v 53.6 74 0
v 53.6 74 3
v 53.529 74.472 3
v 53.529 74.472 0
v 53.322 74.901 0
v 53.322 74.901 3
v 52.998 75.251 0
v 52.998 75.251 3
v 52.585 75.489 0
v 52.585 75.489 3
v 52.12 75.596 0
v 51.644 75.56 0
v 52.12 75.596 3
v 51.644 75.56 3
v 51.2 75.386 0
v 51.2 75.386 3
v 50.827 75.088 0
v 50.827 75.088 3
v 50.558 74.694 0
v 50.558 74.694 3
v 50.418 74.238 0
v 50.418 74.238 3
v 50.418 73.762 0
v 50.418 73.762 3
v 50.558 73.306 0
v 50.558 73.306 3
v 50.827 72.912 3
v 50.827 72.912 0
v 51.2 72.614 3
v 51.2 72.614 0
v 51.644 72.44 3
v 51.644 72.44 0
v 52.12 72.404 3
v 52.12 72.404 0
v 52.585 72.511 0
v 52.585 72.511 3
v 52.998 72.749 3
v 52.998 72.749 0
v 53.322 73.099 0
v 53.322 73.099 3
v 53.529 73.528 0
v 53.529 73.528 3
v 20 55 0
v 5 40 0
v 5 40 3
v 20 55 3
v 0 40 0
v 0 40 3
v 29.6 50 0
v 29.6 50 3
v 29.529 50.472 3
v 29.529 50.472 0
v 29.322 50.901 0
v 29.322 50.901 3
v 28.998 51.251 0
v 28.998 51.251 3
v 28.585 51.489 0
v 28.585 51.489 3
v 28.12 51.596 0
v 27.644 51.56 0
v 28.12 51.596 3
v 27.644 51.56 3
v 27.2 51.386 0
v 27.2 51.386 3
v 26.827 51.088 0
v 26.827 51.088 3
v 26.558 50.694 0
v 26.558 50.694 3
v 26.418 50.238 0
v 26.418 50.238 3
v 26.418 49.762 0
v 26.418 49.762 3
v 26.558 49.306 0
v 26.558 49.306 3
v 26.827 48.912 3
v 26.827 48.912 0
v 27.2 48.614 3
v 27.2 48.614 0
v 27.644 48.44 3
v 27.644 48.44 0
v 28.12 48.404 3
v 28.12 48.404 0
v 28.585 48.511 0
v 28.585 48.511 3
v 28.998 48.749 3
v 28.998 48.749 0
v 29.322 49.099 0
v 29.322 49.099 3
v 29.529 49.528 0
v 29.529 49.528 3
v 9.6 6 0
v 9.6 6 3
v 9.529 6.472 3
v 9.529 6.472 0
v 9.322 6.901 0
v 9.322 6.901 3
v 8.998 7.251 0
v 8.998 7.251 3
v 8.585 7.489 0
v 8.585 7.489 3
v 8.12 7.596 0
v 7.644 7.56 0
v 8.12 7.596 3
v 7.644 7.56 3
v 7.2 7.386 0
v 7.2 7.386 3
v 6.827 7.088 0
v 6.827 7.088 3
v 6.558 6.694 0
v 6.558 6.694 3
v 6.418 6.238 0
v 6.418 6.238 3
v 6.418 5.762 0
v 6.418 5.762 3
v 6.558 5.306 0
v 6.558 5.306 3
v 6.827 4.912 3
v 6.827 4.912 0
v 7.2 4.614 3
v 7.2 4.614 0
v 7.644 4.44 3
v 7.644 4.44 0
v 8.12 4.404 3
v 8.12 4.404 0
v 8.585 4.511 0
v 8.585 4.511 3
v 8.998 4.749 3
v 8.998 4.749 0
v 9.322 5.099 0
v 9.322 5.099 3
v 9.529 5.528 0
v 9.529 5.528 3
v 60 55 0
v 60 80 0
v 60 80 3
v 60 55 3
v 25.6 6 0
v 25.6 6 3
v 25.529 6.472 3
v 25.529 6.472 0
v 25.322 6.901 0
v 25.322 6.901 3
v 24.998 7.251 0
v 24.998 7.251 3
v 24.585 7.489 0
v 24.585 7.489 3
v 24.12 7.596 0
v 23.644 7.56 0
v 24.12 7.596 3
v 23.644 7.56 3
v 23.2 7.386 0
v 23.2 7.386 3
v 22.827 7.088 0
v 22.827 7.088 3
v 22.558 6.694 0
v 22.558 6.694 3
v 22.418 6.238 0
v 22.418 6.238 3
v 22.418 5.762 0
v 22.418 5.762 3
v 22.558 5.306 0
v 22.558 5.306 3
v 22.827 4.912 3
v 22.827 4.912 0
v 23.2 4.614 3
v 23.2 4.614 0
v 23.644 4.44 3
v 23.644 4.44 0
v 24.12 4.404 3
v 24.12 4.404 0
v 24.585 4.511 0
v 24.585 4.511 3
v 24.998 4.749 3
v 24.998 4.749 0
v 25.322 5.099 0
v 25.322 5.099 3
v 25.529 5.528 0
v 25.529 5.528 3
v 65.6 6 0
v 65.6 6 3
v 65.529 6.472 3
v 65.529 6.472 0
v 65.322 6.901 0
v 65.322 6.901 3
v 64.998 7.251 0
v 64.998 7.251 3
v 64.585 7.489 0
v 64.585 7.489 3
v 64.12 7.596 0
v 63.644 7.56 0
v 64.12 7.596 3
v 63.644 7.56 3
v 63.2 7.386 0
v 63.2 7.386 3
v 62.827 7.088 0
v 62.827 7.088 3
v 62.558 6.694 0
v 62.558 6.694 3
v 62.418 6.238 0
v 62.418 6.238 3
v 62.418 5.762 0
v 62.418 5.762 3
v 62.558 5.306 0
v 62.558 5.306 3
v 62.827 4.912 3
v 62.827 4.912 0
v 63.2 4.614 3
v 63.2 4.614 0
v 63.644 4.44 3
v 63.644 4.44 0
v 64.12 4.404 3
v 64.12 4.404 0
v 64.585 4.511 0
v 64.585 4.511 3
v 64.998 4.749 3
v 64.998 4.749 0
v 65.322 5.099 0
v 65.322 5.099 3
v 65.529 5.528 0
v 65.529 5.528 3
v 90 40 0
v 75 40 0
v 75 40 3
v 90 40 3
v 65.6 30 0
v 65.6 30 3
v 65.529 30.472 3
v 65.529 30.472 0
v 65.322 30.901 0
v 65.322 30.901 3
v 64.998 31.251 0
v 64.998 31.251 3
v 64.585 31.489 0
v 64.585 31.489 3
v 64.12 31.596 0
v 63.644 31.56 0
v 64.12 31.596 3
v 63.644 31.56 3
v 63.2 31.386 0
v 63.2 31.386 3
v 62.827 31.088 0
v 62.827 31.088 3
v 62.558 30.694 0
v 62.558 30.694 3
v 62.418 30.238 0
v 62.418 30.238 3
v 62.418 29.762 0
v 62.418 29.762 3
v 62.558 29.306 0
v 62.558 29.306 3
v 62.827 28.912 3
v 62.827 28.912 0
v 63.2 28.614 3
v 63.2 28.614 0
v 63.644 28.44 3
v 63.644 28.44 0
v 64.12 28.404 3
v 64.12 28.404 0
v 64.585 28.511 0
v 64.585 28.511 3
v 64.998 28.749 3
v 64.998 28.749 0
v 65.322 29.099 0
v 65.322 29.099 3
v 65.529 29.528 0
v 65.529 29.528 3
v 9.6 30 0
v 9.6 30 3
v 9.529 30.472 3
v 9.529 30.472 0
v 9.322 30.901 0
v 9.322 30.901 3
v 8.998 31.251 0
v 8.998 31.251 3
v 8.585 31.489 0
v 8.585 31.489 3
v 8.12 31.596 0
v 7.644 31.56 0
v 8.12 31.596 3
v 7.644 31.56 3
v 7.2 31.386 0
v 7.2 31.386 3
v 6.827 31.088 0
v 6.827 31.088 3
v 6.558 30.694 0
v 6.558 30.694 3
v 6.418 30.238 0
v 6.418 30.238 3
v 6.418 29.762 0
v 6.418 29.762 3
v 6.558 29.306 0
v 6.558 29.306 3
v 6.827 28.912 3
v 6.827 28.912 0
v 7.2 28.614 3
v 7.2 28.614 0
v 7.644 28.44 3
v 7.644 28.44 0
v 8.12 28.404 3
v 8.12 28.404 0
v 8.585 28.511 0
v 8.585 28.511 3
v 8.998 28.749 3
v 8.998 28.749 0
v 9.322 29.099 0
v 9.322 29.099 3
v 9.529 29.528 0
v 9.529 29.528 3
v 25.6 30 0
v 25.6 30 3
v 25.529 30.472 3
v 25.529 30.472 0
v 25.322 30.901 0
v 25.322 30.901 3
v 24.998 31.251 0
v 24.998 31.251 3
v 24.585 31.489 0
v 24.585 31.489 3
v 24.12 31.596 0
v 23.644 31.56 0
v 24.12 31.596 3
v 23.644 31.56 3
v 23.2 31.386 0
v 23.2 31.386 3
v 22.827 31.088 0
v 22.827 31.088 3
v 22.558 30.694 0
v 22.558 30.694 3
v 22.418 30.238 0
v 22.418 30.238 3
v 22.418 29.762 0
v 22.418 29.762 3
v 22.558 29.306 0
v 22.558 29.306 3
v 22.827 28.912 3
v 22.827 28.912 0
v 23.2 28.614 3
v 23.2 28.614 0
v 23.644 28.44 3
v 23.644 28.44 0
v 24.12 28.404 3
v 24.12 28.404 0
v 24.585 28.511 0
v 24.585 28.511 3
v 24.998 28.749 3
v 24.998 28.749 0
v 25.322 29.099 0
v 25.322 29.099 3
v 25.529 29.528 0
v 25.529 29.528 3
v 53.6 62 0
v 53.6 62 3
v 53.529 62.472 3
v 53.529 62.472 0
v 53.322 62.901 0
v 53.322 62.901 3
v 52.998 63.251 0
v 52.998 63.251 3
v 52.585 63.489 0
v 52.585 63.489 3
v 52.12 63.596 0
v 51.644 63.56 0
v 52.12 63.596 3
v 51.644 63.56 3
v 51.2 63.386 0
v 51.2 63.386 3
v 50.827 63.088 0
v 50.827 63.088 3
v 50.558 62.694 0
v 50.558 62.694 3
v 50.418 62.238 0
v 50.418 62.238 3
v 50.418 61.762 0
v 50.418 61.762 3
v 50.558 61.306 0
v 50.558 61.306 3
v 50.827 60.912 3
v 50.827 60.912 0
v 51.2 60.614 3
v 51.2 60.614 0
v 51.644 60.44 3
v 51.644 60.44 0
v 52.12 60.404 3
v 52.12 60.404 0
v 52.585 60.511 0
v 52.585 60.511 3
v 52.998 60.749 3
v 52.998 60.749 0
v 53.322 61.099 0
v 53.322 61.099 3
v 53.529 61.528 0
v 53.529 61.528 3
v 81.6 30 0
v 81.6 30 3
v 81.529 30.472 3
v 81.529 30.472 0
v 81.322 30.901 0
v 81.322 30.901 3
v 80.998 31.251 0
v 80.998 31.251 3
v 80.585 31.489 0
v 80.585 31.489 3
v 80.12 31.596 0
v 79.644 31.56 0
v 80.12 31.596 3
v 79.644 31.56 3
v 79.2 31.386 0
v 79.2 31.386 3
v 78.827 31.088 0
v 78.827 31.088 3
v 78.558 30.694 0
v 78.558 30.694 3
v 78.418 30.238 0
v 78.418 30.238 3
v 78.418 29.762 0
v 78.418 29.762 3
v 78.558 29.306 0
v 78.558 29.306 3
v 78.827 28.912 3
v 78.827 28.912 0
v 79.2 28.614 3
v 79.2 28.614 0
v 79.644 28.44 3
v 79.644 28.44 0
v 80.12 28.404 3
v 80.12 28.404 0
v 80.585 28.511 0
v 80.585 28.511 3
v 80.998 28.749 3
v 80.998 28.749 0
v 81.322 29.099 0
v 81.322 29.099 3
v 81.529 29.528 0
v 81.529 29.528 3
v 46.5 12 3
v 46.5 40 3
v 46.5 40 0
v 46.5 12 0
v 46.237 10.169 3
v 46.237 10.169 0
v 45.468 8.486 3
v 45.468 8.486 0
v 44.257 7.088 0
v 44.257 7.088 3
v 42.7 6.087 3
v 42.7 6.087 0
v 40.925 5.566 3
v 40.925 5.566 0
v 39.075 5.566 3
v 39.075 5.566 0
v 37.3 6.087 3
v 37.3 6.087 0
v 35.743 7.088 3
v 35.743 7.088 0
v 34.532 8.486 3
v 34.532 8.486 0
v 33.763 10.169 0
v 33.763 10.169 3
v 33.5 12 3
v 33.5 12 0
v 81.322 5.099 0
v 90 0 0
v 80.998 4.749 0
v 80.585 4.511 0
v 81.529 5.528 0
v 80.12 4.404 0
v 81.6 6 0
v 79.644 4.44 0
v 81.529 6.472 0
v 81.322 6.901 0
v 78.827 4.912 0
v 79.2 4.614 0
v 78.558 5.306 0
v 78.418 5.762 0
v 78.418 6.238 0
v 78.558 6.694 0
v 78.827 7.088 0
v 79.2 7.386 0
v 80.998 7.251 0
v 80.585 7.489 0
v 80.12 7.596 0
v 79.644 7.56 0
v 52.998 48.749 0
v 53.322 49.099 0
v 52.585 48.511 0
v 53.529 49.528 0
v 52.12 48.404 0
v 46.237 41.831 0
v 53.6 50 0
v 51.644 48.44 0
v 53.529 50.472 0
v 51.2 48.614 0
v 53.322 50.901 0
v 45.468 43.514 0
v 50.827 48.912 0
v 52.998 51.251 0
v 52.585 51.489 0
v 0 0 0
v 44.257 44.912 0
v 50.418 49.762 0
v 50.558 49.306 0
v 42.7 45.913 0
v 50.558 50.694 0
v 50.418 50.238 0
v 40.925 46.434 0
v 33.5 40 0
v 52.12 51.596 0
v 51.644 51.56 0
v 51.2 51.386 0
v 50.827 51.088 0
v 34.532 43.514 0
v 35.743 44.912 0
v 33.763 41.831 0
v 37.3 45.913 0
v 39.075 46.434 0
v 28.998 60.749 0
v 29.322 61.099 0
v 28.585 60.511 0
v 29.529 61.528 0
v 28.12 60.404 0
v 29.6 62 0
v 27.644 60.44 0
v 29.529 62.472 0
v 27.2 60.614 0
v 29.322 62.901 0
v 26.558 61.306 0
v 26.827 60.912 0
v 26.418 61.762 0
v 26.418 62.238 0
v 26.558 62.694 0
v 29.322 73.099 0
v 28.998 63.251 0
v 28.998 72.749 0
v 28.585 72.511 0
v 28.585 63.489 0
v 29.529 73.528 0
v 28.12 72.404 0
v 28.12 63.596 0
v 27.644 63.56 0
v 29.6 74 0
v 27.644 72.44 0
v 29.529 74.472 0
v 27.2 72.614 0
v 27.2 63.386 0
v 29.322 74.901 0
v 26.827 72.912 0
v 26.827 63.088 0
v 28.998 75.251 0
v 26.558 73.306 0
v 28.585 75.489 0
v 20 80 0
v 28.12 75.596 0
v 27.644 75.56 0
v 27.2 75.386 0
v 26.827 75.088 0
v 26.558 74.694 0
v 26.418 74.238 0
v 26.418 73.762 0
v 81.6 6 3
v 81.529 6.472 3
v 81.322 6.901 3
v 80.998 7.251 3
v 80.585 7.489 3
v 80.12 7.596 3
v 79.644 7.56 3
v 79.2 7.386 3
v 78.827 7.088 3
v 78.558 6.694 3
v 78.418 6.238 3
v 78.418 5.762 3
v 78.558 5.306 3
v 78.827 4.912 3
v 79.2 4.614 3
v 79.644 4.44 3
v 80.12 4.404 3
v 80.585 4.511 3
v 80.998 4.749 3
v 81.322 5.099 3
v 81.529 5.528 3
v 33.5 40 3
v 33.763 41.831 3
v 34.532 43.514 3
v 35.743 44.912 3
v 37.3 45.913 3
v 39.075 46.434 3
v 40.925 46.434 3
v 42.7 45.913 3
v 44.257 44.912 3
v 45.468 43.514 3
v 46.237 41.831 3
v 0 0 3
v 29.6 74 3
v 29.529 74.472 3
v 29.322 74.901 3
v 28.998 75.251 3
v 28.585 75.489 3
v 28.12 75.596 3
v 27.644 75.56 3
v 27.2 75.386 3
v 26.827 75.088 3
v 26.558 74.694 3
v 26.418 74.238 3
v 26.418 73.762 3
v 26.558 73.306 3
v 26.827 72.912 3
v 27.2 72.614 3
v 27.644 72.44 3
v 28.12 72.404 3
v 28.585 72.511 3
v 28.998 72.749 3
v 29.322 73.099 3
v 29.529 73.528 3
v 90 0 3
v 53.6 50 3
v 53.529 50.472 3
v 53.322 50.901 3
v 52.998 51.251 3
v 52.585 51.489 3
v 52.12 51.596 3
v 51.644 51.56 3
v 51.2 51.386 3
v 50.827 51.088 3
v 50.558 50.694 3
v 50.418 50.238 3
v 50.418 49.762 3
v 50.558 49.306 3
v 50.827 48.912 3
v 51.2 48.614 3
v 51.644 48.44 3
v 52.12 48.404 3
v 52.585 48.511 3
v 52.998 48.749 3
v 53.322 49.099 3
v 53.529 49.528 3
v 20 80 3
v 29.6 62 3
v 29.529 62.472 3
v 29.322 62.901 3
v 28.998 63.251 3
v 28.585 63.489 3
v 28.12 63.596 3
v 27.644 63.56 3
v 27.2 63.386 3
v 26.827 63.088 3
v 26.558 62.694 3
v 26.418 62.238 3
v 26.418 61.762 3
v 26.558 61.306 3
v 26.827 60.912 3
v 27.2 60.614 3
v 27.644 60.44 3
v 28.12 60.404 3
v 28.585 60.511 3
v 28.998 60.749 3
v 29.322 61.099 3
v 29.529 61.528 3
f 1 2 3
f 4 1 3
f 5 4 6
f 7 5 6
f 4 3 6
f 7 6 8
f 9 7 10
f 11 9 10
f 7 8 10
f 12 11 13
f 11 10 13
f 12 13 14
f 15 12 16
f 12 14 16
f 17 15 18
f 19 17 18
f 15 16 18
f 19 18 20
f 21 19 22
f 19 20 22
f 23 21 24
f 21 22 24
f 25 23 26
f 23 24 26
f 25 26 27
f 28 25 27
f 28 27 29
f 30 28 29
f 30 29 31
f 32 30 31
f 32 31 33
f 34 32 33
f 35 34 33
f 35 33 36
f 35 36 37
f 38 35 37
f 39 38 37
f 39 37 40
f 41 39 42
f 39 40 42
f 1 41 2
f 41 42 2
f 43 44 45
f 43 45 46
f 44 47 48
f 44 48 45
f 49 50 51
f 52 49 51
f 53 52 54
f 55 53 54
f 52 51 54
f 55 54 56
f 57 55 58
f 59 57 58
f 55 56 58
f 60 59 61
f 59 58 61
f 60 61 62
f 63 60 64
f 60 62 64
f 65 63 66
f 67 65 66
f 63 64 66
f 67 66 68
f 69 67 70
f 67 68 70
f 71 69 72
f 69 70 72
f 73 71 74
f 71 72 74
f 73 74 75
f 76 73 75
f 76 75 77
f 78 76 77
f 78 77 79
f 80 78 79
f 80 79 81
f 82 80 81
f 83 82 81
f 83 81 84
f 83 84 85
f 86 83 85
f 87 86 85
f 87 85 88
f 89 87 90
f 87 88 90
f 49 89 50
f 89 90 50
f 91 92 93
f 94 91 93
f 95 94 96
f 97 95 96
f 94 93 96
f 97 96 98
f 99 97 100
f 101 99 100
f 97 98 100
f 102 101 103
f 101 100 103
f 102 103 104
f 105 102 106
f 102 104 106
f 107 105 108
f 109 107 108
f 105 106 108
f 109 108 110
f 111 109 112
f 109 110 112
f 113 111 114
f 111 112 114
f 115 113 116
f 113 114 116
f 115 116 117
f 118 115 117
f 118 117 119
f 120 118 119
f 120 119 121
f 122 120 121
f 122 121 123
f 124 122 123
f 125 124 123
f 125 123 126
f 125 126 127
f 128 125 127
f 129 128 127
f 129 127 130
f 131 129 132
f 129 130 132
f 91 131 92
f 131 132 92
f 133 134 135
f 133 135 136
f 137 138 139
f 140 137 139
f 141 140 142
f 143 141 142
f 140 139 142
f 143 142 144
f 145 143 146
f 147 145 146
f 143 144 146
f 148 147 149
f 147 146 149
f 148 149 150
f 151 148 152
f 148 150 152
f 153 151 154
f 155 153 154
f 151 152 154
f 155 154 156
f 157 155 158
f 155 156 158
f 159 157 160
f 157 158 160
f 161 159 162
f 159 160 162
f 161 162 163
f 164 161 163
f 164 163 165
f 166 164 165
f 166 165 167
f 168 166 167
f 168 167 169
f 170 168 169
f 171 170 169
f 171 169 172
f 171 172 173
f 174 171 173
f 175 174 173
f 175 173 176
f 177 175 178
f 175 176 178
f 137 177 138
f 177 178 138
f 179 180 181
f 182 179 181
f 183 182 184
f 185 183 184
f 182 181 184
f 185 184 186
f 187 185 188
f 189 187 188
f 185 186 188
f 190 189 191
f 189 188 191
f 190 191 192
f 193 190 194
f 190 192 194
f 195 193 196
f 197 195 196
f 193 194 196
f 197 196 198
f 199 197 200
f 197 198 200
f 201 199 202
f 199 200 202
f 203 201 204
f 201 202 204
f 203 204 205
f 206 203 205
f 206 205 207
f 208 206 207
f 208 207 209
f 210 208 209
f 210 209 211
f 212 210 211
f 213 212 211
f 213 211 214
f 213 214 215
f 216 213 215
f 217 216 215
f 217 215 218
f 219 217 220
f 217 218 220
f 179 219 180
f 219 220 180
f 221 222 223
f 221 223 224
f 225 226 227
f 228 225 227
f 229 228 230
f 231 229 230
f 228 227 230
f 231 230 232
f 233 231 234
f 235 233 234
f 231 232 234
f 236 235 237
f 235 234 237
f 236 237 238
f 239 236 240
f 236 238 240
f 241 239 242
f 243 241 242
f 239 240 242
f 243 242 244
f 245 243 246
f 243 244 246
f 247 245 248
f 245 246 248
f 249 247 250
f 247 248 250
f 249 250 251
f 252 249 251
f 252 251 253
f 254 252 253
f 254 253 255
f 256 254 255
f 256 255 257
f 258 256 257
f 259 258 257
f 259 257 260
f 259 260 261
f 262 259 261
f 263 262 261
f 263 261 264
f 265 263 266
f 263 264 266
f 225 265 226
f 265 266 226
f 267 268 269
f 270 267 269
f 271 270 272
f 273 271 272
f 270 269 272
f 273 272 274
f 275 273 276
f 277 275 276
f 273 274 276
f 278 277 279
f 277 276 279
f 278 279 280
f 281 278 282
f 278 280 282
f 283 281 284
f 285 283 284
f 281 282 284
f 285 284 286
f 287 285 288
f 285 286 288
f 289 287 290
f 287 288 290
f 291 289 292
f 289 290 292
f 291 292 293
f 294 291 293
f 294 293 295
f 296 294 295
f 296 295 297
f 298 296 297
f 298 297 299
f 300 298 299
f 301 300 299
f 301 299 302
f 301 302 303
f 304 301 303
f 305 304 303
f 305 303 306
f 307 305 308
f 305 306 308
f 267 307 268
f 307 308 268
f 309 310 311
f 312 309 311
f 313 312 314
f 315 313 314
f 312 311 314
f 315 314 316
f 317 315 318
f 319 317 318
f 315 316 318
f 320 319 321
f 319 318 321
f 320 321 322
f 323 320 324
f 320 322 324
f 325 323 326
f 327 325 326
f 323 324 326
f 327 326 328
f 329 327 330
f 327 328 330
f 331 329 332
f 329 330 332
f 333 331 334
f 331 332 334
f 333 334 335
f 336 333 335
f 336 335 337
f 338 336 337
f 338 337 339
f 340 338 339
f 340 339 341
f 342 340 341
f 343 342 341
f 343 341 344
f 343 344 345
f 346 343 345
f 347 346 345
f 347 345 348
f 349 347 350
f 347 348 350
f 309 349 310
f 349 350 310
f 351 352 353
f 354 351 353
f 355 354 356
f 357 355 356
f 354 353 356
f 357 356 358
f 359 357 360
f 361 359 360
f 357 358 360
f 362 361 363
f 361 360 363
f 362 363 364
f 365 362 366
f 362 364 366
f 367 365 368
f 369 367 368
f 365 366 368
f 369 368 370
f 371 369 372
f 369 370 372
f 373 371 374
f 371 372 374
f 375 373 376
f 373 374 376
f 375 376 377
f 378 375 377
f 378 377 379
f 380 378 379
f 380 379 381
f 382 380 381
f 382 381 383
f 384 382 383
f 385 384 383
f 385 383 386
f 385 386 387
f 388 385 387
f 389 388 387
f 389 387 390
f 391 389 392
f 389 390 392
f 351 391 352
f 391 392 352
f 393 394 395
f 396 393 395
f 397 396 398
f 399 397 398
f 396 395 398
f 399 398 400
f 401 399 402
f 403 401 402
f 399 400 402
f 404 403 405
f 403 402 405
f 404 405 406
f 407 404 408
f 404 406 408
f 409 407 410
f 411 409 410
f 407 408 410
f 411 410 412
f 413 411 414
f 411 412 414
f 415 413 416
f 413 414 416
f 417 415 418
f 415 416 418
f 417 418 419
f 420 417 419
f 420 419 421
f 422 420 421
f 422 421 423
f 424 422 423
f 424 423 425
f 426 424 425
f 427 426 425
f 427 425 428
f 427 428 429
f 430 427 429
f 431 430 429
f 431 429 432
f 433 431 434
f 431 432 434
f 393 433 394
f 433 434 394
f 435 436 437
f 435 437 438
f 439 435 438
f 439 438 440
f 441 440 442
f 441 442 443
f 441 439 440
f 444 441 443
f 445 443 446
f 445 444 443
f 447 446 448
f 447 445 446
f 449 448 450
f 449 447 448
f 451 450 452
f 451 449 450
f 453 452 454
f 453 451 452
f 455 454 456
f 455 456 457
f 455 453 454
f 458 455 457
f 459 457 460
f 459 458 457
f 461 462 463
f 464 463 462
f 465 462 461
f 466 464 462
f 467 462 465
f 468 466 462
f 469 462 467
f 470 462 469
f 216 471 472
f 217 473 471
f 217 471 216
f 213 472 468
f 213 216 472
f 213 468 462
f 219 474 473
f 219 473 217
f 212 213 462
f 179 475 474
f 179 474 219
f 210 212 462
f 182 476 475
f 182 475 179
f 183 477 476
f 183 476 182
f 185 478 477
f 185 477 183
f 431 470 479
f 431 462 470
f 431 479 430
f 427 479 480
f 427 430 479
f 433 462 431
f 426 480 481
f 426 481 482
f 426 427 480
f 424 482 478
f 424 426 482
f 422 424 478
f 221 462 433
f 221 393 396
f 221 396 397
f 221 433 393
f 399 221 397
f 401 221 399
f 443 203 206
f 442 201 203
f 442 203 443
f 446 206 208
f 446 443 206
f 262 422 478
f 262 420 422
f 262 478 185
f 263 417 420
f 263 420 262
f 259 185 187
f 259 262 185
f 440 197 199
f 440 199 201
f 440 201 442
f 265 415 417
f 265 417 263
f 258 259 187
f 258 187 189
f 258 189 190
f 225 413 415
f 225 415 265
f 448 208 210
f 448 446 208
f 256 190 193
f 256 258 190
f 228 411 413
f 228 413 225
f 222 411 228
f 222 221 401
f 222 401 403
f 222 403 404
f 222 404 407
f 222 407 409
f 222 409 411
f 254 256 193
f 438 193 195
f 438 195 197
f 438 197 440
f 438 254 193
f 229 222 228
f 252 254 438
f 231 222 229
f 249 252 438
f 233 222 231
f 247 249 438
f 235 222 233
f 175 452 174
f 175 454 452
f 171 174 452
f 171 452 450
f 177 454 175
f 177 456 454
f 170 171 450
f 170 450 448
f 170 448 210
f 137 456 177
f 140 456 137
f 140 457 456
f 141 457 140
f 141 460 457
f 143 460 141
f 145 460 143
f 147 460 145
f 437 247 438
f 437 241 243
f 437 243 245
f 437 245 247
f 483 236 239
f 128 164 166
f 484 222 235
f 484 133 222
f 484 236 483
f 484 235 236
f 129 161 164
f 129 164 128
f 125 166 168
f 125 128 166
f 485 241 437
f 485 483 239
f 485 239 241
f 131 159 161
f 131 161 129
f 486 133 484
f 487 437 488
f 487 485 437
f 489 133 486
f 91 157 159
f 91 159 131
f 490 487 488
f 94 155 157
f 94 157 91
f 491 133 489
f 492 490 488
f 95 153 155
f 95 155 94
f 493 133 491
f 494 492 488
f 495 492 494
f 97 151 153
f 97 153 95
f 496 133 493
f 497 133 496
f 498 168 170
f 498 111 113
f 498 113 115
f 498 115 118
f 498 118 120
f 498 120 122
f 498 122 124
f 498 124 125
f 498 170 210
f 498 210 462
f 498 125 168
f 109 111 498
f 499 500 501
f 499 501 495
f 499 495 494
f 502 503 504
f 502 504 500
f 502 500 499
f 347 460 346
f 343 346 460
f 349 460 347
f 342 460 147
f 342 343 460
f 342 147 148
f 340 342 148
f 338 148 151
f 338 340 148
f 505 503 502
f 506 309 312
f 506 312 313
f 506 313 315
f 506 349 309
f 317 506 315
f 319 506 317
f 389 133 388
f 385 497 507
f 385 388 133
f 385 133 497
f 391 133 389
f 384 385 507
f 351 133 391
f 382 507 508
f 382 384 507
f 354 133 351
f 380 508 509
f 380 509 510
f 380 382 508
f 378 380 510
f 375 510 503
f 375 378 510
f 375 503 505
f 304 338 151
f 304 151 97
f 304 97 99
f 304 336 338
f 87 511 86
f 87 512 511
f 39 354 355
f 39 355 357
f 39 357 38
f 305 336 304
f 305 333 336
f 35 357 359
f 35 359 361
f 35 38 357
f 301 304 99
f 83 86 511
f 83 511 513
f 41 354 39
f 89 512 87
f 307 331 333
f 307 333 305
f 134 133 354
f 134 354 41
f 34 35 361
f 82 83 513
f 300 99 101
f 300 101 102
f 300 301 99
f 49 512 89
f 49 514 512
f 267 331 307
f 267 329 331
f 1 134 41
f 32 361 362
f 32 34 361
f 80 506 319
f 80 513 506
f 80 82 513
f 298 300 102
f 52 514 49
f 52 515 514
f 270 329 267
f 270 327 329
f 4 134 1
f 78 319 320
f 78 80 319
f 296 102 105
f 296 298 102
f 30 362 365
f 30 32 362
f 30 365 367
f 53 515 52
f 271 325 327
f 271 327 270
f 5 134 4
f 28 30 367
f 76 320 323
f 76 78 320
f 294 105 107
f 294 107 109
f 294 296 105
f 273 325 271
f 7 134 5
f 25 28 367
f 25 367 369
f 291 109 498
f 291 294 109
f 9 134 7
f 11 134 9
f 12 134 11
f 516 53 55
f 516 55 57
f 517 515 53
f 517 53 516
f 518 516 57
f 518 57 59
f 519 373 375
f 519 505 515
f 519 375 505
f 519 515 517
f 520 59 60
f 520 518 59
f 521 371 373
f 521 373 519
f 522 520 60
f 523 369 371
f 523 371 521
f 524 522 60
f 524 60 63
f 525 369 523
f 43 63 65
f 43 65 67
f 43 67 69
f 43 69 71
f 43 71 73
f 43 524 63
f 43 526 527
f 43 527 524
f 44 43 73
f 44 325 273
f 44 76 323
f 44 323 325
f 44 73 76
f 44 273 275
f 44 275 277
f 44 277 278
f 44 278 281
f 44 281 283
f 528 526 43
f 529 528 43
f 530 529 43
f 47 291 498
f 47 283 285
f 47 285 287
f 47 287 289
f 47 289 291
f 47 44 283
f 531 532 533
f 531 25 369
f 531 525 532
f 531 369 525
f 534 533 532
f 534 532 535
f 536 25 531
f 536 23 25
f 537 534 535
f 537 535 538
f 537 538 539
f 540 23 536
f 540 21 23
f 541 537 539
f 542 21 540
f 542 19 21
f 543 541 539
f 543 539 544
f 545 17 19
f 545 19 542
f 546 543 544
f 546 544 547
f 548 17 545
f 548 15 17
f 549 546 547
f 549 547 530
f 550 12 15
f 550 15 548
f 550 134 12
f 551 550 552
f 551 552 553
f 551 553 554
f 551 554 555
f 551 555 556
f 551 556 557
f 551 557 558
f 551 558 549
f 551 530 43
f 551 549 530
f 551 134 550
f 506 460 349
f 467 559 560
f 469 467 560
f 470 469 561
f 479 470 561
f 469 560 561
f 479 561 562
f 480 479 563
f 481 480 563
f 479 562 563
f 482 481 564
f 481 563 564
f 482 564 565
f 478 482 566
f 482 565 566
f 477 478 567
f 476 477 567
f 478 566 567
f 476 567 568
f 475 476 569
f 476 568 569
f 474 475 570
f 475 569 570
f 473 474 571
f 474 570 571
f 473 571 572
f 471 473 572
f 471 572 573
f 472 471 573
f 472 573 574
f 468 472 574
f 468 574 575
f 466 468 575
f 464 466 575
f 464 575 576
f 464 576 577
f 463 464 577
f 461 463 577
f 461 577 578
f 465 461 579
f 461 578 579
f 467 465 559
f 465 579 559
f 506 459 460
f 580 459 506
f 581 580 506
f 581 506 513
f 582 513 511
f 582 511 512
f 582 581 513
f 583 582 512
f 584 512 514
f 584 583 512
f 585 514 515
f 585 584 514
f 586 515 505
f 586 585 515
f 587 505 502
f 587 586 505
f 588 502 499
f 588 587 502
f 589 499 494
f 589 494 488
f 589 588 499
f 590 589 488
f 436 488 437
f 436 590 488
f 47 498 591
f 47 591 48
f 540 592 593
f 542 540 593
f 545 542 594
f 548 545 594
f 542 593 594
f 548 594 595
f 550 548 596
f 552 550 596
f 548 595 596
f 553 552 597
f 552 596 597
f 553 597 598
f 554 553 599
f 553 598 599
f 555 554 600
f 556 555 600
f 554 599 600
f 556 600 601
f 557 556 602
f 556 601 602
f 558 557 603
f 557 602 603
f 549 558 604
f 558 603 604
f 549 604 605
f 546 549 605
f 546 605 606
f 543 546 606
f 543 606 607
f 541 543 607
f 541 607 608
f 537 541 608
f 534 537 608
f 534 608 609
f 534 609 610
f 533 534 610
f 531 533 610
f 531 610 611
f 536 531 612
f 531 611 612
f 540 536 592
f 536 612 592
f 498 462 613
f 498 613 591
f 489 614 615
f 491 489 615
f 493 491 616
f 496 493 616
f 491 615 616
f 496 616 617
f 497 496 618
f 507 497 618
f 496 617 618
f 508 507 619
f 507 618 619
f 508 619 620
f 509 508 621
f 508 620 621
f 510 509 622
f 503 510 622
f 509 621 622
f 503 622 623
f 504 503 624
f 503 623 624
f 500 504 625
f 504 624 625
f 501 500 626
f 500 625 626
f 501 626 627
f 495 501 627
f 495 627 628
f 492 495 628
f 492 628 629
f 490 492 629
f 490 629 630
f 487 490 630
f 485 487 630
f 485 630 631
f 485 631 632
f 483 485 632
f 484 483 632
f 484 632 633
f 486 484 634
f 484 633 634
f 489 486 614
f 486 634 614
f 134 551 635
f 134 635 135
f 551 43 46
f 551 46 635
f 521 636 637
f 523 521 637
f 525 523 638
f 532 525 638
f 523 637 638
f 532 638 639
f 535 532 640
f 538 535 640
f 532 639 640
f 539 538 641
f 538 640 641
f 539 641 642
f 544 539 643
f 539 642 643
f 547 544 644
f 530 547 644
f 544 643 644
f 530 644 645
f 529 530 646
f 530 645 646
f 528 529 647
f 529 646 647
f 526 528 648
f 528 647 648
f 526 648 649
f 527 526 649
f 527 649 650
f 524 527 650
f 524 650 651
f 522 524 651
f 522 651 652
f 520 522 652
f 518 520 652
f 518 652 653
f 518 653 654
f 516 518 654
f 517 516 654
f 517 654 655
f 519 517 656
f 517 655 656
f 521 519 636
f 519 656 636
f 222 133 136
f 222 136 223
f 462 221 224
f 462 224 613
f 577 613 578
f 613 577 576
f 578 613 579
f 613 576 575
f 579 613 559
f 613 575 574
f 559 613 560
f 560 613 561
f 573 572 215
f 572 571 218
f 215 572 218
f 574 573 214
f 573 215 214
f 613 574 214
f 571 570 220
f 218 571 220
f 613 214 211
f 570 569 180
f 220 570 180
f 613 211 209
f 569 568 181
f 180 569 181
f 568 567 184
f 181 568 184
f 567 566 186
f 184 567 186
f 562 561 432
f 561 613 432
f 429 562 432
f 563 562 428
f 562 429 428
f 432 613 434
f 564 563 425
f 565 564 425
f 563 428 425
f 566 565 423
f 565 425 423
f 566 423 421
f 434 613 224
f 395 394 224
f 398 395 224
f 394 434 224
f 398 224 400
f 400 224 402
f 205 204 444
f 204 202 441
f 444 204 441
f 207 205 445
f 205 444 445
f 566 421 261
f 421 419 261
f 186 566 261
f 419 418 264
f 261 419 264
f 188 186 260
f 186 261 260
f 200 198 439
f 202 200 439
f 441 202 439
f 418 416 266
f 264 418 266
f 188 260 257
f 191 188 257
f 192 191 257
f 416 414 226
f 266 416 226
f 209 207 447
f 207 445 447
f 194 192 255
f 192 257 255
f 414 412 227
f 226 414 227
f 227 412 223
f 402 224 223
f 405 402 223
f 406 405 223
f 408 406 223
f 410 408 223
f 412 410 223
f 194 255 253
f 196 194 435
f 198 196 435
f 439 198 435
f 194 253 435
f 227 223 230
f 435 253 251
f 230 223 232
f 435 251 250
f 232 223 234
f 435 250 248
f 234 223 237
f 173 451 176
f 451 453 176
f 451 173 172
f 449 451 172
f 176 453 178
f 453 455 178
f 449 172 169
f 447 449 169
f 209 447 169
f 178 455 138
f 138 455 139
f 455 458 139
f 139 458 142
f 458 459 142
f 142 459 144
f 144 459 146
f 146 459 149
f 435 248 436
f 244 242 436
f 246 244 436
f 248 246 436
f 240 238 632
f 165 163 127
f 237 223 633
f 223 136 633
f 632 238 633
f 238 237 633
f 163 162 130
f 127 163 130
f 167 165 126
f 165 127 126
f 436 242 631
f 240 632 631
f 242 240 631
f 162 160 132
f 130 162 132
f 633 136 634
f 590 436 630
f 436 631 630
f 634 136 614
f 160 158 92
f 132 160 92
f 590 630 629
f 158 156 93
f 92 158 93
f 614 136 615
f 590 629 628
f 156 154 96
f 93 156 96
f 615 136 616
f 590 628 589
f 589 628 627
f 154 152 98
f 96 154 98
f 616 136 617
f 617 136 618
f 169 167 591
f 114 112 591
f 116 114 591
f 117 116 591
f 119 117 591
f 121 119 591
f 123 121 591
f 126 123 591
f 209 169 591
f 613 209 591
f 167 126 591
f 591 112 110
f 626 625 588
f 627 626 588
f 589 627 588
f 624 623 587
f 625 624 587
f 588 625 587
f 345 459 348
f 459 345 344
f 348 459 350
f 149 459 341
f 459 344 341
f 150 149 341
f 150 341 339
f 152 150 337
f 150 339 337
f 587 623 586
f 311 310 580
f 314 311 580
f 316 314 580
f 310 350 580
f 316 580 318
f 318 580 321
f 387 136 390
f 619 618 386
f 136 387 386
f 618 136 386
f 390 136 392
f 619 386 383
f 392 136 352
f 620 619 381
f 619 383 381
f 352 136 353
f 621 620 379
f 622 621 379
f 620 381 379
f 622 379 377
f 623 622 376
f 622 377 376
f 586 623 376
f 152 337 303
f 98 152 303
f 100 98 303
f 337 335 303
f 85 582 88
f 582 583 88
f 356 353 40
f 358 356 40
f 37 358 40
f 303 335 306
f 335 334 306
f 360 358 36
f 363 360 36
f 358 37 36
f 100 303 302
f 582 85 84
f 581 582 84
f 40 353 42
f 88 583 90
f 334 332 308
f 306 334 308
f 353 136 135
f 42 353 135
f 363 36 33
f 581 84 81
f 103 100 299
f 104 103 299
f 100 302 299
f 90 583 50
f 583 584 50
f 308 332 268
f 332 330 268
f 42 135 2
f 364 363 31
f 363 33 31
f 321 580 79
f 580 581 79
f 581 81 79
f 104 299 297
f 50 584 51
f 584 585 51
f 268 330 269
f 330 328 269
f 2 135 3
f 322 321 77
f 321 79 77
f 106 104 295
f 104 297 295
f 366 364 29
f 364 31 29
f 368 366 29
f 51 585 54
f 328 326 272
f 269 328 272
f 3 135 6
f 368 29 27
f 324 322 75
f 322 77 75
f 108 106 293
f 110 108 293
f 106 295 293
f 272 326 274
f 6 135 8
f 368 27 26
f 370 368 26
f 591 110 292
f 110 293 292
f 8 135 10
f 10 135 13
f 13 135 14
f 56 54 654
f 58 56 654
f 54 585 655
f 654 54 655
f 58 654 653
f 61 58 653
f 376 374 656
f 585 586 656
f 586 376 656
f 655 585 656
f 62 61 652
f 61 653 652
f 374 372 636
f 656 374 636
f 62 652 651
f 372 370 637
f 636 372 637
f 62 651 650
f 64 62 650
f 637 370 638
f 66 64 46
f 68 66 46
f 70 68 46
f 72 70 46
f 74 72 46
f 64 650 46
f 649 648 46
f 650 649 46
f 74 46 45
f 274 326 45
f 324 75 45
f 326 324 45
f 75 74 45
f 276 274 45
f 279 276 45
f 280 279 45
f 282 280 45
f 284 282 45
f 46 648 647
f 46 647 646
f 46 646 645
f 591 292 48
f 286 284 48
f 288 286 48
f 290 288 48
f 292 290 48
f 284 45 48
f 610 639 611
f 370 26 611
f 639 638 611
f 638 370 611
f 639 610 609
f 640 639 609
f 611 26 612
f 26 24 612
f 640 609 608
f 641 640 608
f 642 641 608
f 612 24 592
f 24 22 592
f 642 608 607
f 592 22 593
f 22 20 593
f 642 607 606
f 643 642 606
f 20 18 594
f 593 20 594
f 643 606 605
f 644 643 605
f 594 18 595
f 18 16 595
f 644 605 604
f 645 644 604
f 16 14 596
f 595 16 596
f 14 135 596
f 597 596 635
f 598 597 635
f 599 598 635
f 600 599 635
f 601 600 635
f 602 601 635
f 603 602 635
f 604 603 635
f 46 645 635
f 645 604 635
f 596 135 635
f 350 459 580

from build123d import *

# Parameters (mm, degrees)
EXTRUDE_1_DEPTH     = 3
SKETCH_2_R          = 1.6
CUT_EXTRUDE_1_DEPTH = 3


with BuildPart() as part:
    # 草图1 → 凸台-拉伸1 (new body)
    with BuildSketch(Plane.XY):
        Polygon((0, 0), (0, 40), (5, 40), (20, 55), (20, 80), (60, 80), (60, 55), (75, 40), (90, 40), (90, 0), align=None)
    extrude(amount=EXTRUDE_1_DEPTH)

    # 草图2 → 切除-拉伸1 (cut)
    with BuildSketch(Plane.XY.offset(3)):
        with Locations((28, 74)):
            Circle(SKETCH_2_R)
        with Locations((28, 50)):
            Circle(SKETCH_2_R)
        with Locations((52, 74)):
            Circle(SKETCH_2_R)
        with Locations((52, 50)):
            Circle(SKETCH_2_R)
        with Locations((8, 30)):
            Circle(SKETCH_2_R)
        with Locations((24, 30)):
            Circle(SKETCH_2_R)
        with Locations((80, 30)):
            Circle(SKETCH_2_R)
        with Locations((64, 30)):
            Circle(SKETCH_2_R)
        with Locations((80, 6)):
            Circle(SKETCH_2_R)
        with Locations((64, 6)):
            Circle(SKETCH_2_R)
        with Locations((24, 6)):
            Circle(SKETCH_2_R)
        with Locations((8, 6)):
            Circle(SKETCH_2_R)
        with Locations((28, 62)):
            Circle(SKETCH_2_R)
        with Locations((52, 62)):
            Circle(SKETCH_2_R)
        with BuildLine():
            Line((46.5, 40), (46.5, 12))
            ThreePointArc((46.5, 12), (40, 5.5), (33.5, 12))
            Line((33.5, 12), (33.5, 40))
            ThreePointArc((33.5, 40), (40, 46.5), (46.5, 40))
        make_face()
    extrude(amount=-CUT_EXTRUDE_1_DEPTH, mode=Mode.SUBTRACT)


solid = part.part
